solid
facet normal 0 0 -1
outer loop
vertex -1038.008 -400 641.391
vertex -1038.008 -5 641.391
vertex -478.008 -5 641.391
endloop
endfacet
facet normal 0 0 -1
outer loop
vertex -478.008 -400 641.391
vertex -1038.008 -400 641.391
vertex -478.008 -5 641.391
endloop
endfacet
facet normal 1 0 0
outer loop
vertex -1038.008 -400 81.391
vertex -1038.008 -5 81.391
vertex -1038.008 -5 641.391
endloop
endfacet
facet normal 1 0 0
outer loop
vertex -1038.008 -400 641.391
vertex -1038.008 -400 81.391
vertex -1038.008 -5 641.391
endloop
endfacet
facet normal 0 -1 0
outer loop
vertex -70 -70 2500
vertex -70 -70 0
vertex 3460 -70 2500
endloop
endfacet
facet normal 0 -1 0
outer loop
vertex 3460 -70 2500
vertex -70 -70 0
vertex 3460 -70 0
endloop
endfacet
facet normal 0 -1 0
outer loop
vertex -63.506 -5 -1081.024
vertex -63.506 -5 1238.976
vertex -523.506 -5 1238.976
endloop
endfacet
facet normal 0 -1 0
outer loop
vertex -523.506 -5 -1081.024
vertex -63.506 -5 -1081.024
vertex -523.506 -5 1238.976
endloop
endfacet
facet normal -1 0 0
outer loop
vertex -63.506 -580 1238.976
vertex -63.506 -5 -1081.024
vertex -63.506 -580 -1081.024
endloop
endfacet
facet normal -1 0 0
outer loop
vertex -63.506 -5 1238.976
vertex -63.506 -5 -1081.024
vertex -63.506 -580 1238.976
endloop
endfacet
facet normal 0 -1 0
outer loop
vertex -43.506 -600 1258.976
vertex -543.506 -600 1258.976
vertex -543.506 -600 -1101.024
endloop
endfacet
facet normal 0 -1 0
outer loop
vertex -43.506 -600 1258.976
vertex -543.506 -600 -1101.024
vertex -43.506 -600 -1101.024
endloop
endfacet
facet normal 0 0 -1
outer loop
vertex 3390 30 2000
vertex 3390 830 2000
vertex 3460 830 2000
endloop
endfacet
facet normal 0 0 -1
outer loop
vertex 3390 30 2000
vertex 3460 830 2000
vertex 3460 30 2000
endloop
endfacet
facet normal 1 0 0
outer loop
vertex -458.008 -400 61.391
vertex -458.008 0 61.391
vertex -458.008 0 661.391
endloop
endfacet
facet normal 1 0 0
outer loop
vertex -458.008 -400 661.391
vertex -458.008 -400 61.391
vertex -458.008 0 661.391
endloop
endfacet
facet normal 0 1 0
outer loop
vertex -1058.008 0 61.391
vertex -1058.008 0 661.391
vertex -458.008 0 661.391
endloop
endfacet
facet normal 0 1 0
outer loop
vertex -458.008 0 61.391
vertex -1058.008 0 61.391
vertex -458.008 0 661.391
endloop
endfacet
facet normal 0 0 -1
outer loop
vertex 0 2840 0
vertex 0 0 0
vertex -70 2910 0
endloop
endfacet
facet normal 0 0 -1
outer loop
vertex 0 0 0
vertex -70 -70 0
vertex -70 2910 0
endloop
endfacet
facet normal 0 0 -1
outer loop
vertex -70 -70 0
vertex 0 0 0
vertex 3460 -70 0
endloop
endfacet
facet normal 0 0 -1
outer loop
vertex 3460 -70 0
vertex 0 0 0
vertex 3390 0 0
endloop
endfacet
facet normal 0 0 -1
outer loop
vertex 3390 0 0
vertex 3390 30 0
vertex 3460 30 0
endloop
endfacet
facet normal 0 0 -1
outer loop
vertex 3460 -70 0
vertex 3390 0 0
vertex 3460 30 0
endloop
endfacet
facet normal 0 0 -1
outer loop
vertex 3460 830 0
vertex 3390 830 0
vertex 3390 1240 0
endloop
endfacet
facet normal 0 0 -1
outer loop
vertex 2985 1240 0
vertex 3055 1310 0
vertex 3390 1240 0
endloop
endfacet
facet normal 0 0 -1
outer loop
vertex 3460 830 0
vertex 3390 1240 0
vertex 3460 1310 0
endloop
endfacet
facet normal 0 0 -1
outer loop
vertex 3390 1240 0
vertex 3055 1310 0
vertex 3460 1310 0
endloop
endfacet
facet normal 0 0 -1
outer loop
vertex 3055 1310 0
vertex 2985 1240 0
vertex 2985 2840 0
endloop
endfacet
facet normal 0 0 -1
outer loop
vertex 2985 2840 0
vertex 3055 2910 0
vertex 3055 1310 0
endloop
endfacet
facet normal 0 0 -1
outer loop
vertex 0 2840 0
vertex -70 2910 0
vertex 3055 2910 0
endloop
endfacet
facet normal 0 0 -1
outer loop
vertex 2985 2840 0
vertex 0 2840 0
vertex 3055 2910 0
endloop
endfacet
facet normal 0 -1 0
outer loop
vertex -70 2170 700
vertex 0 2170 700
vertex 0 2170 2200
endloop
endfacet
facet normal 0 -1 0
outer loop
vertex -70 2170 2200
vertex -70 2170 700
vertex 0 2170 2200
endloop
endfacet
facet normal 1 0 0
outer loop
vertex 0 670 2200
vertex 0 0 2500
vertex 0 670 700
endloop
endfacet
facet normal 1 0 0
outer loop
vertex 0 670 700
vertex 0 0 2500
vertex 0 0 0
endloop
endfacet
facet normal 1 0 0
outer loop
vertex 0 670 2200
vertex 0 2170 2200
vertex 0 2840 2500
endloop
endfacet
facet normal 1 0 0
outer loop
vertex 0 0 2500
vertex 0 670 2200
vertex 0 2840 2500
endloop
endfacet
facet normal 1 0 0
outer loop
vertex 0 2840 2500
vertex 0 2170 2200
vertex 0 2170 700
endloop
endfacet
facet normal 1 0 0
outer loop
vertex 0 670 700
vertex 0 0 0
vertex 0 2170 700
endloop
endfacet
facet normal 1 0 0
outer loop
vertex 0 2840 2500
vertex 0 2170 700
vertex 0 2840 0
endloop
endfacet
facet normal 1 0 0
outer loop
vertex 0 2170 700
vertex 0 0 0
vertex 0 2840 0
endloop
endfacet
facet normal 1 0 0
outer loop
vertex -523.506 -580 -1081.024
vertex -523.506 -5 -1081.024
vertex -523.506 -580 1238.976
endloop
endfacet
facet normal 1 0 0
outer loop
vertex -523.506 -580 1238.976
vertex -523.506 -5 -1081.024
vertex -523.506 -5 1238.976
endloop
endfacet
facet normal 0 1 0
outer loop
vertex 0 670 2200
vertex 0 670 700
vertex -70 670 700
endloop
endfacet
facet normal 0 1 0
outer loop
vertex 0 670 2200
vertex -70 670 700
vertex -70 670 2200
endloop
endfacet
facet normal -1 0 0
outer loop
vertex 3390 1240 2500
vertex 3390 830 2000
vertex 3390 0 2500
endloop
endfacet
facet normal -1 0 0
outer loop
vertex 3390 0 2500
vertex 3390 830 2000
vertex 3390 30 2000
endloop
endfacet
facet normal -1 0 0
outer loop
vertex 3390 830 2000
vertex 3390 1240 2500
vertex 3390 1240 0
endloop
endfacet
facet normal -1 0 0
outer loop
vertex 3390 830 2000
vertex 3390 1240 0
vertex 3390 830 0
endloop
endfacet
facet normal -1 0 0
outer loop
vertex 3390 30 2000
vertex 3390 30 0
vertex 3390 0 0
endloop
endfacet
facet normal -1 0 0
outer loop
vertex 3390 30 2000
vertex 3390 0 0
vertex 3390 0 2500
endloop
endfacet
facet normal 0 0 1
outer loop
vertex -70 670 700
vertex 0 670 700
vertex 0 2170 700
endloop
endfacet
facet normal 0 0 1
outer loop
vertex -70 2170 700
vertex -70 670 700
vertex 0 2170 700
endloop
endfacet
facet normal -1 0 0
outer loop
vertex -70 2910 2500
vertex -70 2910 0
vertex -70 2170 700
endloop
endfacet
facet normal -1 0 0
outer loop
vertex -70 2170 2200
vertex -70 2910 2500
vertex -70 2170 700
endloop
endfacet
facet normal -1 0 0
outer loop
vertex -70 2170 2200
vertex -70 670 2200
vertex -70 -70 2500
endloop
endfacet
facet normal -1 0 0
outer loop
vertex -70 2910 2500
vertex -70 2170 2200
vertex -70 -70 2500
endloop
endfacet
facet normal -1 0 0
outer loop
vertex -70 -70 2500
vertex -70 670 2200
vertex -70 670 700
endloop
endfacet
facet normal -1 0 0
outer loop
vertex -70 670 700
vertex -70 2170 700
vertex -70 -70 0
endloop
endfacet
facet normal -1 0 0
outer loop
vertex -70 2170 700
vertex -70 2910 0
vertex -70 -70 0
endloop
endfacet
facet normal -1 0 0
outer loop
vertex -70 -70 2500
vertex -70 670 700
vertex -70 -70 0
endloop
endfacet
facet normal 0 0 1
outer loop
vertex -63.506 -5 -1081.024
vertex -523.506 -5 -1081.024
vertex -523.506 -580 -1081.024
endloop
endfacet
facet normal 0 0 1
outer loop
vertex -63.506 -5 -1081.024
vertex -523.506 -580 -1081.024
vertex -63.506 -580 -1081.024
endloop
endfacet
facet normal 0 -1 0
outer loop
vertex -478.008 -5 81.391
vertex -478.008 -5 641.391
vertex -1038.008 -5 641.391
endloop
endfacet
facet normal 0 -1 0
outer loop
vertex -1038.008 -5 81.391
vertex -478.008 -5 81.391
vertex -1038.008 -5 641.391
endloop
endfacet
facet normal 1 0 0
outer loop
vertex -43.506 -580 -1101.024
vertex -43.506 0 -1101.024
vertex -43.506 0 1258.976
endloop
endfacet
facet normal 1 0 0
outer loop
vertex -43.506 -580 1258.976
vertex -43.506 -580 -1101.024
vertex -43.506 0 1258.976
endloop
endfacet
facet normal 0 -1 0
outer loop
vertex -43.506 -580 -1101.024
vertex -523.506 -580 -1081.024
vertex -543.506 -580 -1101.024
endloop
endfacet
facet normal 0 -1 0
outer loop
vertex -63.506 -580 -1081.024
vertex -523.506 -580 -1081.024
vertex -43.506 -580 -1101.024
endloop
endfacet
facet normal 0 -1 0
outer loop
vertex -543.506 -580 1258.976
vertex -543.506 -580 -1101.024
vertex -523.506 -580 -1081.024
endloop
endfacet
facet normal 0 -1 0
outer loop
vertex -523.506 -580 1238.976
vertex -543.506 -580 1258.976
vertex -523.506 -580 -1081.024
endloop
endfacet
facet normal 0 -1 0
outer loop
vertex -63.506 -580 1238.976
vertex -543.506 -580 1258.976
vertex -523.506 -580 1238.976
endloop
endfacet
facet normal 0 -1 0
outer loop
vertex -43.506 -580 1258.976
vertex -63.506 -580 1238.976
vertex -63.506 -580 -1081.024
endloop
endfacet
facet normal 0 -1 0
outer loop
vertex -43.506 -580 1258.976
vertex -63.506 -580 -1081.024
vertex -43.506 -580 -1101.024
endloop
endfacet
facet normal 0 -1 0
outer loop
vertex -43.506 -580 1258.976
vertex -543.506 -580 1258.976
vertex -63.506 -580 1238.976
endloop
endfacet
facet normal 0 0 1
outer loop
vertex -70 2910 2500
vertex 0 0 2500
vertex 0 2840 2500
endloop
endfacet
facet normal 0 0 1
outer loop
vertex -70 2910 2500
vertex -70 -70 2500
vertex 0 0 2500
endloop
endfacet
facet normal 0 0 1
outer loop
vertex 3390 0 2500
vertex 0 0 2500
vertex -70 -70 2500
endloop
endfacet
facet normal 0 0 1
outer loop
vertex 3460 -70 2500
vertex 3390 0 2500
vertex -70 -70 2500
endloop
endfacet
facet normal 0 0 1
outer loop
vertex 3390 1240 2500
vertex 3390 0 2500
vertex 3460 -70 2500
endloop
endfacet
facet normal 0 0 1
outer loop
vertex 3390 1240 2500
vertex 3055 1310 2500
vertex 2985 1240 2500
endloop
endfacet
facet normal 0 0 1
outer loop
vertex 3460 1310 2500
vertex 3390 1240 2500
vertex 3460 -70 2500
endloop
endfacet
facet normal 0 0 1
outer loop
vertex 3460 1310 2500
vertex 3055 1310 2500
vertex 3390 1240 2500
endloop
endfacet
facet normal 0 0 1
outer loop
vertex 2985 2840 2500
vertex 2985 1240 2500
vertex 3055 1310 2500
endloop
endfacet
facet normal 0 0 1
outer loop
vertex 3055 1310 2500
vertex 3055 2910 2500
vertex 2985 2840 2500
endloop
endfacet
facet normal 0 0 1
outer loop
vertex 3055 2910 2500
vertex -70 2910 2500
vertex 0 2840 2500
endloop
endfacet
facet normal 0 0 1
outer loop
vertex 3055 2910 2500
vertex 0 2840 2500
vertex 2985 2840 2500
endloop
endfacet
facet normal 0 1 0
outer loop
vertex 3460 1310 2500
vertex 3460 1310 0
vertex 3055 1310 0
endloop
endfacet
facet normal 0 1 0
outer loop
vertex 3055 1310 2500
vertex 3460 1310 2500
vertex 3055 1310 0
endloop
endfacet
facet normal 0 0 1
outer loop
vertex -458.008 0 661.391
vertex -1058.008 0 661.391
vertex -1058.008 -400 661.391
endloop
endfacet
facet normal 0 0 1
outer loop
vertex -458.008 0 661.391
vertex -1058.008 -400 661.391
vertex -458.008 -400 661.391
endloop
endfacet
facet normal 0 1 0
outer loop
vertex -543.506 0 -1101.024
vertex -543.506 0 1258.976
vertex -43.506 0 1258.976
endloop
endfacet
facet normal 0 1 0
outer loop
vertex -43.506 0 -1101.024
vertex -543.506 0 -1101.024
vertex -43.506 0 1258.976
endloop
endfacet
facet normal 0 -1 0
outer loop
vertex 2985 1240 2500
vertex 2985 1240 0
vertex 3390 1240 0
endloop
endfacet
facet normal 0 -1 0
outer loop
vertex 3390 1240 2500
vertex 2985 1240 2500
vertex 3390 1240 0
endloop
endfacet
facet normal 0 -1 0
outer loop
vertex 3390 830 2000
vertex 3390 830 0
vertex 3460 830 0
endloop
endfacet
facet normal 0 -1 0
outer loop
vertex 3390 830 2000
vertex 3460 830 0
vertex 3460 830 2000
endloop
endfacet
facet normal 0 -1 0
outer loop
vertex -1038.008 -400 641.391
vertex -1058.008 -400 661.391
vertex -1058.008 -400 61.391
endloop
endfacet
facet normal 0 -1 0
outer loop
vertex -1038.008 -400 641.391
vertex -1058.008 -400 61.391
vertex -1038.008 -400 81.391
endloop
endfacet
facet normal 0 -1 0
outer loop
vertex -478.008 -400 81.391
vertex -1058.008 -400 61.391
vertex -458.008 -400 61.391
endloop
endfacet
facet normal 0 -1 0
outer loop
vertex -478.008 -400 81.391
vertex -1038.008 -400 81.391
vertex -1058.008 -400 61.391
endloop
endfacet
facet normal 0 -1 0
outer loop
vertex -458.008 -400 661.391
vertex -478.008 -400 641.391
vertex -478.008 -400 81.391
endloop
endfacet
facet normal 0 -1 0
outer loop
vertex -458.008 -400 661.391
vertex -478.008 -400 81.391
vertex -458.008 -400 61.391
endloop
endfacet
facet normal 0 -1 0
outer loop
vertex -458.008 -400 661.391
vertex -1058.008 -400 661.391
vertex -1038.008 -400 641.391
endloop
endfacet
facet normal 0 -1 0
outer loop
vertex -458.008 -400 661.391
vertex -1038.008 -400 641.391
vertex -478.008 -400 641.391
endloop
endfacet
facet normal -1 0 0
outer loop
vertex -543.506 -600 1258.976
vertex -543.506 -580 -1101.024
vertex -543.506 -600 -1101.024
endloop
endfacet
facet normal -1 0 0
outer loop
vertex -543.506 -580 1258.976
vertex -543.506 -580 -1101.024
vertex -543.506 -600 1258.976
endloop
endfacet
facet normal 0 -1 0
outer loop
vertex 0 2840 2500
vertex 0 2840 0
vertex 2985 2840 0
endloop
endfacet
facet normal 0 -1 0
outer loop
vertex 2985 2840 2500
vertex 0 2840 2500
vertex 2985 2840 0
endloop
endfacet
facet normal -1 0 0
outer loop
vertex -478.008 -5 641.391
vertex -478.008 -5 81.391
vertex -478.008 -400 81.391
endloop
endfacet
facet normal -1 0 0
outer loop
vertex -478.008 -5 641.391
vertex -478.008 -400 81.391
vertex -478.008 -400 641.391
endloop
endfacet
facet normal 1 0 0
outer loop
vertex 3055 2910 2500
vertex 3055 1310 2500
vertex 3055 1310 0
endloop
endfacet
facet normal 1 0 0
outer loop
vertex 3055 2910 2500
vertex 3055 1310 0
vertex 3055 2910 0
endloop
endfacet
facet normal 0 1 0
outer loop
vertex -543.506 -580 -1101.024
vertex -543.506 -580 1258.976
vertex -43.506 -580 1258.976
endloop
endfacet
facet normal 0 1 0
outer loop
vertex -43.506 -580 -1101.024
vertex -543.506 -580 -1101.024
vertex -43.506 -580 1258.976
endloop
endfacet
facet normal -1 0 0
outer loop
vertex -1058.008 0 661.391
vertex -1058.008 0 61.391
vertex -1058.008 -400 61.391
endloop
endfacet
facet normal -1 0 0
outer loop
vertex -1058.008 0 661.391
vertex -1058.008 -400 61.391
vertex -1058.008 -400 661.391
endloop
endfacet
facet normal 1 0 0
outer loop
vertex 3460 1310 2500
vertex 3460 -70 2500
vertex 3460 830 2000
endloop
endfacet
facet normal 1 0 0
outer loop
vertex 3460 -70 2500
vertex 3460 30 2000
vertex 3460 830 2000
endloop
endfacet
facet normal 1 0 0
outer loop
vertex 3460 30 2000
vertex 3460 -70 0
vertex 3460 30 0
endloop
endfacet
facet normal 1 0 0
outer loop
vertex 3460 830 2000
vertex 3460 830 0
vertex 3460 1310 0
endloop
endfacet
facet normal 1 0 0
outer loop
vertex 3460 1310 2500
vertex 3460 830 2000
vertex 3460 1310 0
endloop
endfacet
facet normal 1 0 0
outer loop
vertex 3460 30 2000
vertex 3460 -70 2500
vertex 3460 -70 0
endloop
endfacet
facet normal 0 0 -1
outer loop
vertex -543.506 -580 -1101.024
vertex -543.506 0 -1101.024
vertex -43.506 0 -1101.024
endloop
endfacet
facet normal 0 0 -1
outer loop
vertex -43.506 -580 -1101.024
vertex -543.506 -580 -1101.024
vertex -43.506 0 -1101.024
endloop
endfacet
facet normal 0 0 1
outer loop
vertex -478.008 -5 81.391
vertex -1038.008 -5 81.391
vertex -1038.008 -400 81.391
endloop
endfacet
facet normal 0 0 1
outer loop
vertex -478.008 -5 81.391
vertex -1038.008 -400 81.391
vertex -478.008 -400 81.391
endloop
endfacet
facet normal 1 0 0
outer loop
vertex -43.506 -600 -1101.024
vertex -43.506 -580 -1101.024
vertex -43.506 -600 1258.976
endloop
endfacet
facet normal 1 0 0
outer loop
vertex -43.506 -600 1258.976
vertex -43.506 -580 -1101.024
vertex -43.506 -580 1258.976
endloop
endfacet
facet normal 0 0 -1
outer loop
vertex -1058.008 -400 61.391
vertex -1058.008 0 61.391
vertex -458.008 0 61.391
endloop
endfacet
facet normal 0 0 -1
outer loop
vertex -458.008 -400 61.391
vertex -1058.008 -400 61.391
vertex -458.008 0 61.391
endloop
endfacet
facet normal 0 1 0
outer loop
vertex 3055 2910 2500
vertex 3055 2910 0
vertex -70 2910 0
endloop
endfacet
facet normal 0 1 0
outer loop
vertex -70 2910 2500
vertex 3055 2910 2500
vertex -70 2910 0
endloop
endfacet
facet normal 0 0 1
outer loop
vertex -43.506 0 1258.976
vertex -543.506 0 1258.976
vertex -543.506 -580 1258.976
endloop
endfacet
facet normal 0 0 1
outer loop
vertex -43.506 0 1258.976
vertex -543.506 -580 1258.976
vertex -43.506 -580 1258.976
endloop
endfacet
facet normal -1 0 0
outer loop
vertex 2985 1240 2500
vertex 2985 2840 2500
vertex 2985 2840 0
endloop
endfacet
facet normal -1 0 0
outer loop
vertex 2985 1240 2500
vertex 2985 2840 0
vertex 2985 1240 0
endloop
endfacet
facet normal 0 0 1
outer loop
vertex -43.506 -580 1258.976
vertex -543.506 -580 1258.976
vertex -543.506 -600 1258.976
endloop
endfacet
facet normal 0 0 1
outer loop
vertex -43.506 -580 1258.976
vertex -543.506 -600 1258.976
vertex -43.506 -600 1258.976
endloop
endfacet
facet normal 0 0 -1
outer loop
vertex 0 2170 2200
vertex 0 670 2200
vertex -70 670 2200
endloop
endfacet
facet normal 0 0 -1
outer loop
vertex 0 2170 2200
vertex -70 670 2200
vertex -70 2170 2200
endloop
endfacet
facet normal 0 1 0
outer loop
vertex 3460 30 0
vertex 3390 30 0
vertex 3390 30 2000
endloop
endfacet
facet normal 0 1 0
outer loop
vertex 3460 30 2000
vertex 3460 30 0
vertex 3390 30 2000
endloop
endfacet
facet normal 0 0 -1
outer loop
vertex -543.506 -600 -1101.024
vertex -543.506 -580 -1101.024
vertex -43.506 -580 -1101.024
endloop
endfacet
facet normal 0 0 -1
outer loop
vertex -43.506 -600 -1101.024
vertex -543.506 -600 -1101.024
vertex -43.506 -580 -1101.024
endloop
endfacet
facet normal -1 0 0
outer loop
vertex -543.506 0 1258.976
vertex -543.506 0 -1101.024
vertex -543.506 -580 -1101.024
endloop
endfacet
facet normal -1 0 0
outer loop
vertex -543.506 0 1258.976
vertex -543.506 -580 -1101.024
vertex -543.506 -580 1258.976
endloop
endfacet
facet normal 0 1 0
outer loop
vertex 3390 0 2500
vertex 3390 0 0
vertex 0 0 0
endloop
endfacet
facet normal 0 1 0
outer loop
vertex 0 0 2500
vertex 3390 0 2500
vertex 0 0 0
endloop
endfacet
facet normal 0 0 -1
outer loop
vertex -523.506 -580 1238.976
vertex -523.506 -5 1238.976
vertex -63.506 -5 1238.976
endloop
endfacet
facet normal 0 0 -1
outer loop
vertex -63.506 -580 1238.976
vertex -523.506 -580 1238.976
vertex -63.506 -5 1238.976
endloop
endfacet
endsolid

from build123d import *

# Parameters (mm, degrees)
F1_DEPTH  = 2500
F2_W      = 800
F2_H      = 2000
F3_DEPTH  = 70
F4_W      = 1500
F4_H      = 1500
F5_DEPTH  = 70
F6_W      = 500
F6_H      = 2360
F6_W_2    = 460
F6_H_2    = 2320
F7_DEPTH  = 580
F8_W      = 500
F8_H      = 2360
F9_DEPTH  = 5
F10_W     = 500
F10_H     = 2360
F11_DEPTH = 20
F12_W     = 600
F12_H     = 600
F12_W_2   = 560
F12_H_2   = 560
F13_DEPTH = 400
F14_W     = 600
F14_H     = 600
F15_DEPTH = 5


with BuildPart() as f1:
    # F0 (on Top) → F1 (new body)
    with BuildSketch(Plane.XY):
        Polygon((3460, -70), (3460, 830), (3460, 1310), (3055, 1310), (3055, 2910), (-70, 2910), (-70, -70), align=None)
        Polygon((3390, 0), (0, 0), (0, 2840), (2985, 2840), (2985, 1240), (3390, 1240), (3390, 830), align=None, mode=Mode.SUBTRACT)
    extrude(amount=F1_DEPTH)

    # F2 (on face) → F3 (cut, through all)
    with BuildSketch(Plane(origin=(3390, 0, 0), x_dir=(0, -1, 0), z_dir=(-1, 0, 0))):
        with Locations((-430, 1000)):
            Rectangle(F2_W, F2_H)
    extrude(amount=-F3_DEPTH, mode=Mode.SUBTRACT)

    # F4 (on face) → F5 (cut, through all)
    with BuildSketch(Plane.YZ):
        with Locations((1420, 1450)):
            Rectangle(F4_W, F4_H)
    extrude(amount=-F5_DEPTH, mode=Mode.SUBTRACT)


with BuildPart() as f7:
    # F6 (on Front) → F7 (new body)
    with BuildSketch(Plane.XZ):
        with Locations((-293.5058398881, 78.9764812216)):
            Rectangle(F6_W, F6_H)
        with Locations((-293.5058398881, 78.9764812216)):
            Rectangle(F6_W_2, F6_H_2, mode=Mode.SUBTRACT)
    extrude(amount=F7_DEPTH)

    # F8 (on face) → F9 (join)
    with BuildSketch(Plane(origin=(0, 0, 0), x_dir=(-1, 0, 0), z_dir=(0, 1, 0))):
        with Locations((293.5058398881, 78.9764812216)):
            Rectangle(F8_W, F8_H)
    extrude(amount=-F9_DEPTH)


with BuildPart() as f11:
    # F10 (on face) → F11 (new body)
    with BuildSketch(Plane.XZ.offset(580)):
        with Locations((-293.5058398881, 78.9764812216)):
            Rectangle(F10_W, F10_H)
    extrude(amount=F11_DEPTH)


with BuildPart() as f13:
    # F12 (on Front) → F13 (new body)
    with BuildSketch(Plane.XZ):
        with Locations((-758.0079734325, 361.3910255028)):
            Rectangle(F12_W, F12_H)
        with Locations((-758.0079734325, 361.3910255028)):
            Rectangle(F12_W_2, F12_H_2, mode=Mode.SUBTRACT)
    extrude(amount=F13_DEPTH)

    # F14 (on face) → F15 (join)
    with BuildSketch(Plane(origin=(0, 0, 0), x_dir=(-1, 0, 0), z_dir=(0, 1, 0))):
        with Locations((758.0079734325, 361.3910255028)):
            Rectangle(F14_W, F14_H)
    extrude(amount=-F15_DEPTH)


solid = Compound([f1.part, f7.part, f11.part, f13.part])
